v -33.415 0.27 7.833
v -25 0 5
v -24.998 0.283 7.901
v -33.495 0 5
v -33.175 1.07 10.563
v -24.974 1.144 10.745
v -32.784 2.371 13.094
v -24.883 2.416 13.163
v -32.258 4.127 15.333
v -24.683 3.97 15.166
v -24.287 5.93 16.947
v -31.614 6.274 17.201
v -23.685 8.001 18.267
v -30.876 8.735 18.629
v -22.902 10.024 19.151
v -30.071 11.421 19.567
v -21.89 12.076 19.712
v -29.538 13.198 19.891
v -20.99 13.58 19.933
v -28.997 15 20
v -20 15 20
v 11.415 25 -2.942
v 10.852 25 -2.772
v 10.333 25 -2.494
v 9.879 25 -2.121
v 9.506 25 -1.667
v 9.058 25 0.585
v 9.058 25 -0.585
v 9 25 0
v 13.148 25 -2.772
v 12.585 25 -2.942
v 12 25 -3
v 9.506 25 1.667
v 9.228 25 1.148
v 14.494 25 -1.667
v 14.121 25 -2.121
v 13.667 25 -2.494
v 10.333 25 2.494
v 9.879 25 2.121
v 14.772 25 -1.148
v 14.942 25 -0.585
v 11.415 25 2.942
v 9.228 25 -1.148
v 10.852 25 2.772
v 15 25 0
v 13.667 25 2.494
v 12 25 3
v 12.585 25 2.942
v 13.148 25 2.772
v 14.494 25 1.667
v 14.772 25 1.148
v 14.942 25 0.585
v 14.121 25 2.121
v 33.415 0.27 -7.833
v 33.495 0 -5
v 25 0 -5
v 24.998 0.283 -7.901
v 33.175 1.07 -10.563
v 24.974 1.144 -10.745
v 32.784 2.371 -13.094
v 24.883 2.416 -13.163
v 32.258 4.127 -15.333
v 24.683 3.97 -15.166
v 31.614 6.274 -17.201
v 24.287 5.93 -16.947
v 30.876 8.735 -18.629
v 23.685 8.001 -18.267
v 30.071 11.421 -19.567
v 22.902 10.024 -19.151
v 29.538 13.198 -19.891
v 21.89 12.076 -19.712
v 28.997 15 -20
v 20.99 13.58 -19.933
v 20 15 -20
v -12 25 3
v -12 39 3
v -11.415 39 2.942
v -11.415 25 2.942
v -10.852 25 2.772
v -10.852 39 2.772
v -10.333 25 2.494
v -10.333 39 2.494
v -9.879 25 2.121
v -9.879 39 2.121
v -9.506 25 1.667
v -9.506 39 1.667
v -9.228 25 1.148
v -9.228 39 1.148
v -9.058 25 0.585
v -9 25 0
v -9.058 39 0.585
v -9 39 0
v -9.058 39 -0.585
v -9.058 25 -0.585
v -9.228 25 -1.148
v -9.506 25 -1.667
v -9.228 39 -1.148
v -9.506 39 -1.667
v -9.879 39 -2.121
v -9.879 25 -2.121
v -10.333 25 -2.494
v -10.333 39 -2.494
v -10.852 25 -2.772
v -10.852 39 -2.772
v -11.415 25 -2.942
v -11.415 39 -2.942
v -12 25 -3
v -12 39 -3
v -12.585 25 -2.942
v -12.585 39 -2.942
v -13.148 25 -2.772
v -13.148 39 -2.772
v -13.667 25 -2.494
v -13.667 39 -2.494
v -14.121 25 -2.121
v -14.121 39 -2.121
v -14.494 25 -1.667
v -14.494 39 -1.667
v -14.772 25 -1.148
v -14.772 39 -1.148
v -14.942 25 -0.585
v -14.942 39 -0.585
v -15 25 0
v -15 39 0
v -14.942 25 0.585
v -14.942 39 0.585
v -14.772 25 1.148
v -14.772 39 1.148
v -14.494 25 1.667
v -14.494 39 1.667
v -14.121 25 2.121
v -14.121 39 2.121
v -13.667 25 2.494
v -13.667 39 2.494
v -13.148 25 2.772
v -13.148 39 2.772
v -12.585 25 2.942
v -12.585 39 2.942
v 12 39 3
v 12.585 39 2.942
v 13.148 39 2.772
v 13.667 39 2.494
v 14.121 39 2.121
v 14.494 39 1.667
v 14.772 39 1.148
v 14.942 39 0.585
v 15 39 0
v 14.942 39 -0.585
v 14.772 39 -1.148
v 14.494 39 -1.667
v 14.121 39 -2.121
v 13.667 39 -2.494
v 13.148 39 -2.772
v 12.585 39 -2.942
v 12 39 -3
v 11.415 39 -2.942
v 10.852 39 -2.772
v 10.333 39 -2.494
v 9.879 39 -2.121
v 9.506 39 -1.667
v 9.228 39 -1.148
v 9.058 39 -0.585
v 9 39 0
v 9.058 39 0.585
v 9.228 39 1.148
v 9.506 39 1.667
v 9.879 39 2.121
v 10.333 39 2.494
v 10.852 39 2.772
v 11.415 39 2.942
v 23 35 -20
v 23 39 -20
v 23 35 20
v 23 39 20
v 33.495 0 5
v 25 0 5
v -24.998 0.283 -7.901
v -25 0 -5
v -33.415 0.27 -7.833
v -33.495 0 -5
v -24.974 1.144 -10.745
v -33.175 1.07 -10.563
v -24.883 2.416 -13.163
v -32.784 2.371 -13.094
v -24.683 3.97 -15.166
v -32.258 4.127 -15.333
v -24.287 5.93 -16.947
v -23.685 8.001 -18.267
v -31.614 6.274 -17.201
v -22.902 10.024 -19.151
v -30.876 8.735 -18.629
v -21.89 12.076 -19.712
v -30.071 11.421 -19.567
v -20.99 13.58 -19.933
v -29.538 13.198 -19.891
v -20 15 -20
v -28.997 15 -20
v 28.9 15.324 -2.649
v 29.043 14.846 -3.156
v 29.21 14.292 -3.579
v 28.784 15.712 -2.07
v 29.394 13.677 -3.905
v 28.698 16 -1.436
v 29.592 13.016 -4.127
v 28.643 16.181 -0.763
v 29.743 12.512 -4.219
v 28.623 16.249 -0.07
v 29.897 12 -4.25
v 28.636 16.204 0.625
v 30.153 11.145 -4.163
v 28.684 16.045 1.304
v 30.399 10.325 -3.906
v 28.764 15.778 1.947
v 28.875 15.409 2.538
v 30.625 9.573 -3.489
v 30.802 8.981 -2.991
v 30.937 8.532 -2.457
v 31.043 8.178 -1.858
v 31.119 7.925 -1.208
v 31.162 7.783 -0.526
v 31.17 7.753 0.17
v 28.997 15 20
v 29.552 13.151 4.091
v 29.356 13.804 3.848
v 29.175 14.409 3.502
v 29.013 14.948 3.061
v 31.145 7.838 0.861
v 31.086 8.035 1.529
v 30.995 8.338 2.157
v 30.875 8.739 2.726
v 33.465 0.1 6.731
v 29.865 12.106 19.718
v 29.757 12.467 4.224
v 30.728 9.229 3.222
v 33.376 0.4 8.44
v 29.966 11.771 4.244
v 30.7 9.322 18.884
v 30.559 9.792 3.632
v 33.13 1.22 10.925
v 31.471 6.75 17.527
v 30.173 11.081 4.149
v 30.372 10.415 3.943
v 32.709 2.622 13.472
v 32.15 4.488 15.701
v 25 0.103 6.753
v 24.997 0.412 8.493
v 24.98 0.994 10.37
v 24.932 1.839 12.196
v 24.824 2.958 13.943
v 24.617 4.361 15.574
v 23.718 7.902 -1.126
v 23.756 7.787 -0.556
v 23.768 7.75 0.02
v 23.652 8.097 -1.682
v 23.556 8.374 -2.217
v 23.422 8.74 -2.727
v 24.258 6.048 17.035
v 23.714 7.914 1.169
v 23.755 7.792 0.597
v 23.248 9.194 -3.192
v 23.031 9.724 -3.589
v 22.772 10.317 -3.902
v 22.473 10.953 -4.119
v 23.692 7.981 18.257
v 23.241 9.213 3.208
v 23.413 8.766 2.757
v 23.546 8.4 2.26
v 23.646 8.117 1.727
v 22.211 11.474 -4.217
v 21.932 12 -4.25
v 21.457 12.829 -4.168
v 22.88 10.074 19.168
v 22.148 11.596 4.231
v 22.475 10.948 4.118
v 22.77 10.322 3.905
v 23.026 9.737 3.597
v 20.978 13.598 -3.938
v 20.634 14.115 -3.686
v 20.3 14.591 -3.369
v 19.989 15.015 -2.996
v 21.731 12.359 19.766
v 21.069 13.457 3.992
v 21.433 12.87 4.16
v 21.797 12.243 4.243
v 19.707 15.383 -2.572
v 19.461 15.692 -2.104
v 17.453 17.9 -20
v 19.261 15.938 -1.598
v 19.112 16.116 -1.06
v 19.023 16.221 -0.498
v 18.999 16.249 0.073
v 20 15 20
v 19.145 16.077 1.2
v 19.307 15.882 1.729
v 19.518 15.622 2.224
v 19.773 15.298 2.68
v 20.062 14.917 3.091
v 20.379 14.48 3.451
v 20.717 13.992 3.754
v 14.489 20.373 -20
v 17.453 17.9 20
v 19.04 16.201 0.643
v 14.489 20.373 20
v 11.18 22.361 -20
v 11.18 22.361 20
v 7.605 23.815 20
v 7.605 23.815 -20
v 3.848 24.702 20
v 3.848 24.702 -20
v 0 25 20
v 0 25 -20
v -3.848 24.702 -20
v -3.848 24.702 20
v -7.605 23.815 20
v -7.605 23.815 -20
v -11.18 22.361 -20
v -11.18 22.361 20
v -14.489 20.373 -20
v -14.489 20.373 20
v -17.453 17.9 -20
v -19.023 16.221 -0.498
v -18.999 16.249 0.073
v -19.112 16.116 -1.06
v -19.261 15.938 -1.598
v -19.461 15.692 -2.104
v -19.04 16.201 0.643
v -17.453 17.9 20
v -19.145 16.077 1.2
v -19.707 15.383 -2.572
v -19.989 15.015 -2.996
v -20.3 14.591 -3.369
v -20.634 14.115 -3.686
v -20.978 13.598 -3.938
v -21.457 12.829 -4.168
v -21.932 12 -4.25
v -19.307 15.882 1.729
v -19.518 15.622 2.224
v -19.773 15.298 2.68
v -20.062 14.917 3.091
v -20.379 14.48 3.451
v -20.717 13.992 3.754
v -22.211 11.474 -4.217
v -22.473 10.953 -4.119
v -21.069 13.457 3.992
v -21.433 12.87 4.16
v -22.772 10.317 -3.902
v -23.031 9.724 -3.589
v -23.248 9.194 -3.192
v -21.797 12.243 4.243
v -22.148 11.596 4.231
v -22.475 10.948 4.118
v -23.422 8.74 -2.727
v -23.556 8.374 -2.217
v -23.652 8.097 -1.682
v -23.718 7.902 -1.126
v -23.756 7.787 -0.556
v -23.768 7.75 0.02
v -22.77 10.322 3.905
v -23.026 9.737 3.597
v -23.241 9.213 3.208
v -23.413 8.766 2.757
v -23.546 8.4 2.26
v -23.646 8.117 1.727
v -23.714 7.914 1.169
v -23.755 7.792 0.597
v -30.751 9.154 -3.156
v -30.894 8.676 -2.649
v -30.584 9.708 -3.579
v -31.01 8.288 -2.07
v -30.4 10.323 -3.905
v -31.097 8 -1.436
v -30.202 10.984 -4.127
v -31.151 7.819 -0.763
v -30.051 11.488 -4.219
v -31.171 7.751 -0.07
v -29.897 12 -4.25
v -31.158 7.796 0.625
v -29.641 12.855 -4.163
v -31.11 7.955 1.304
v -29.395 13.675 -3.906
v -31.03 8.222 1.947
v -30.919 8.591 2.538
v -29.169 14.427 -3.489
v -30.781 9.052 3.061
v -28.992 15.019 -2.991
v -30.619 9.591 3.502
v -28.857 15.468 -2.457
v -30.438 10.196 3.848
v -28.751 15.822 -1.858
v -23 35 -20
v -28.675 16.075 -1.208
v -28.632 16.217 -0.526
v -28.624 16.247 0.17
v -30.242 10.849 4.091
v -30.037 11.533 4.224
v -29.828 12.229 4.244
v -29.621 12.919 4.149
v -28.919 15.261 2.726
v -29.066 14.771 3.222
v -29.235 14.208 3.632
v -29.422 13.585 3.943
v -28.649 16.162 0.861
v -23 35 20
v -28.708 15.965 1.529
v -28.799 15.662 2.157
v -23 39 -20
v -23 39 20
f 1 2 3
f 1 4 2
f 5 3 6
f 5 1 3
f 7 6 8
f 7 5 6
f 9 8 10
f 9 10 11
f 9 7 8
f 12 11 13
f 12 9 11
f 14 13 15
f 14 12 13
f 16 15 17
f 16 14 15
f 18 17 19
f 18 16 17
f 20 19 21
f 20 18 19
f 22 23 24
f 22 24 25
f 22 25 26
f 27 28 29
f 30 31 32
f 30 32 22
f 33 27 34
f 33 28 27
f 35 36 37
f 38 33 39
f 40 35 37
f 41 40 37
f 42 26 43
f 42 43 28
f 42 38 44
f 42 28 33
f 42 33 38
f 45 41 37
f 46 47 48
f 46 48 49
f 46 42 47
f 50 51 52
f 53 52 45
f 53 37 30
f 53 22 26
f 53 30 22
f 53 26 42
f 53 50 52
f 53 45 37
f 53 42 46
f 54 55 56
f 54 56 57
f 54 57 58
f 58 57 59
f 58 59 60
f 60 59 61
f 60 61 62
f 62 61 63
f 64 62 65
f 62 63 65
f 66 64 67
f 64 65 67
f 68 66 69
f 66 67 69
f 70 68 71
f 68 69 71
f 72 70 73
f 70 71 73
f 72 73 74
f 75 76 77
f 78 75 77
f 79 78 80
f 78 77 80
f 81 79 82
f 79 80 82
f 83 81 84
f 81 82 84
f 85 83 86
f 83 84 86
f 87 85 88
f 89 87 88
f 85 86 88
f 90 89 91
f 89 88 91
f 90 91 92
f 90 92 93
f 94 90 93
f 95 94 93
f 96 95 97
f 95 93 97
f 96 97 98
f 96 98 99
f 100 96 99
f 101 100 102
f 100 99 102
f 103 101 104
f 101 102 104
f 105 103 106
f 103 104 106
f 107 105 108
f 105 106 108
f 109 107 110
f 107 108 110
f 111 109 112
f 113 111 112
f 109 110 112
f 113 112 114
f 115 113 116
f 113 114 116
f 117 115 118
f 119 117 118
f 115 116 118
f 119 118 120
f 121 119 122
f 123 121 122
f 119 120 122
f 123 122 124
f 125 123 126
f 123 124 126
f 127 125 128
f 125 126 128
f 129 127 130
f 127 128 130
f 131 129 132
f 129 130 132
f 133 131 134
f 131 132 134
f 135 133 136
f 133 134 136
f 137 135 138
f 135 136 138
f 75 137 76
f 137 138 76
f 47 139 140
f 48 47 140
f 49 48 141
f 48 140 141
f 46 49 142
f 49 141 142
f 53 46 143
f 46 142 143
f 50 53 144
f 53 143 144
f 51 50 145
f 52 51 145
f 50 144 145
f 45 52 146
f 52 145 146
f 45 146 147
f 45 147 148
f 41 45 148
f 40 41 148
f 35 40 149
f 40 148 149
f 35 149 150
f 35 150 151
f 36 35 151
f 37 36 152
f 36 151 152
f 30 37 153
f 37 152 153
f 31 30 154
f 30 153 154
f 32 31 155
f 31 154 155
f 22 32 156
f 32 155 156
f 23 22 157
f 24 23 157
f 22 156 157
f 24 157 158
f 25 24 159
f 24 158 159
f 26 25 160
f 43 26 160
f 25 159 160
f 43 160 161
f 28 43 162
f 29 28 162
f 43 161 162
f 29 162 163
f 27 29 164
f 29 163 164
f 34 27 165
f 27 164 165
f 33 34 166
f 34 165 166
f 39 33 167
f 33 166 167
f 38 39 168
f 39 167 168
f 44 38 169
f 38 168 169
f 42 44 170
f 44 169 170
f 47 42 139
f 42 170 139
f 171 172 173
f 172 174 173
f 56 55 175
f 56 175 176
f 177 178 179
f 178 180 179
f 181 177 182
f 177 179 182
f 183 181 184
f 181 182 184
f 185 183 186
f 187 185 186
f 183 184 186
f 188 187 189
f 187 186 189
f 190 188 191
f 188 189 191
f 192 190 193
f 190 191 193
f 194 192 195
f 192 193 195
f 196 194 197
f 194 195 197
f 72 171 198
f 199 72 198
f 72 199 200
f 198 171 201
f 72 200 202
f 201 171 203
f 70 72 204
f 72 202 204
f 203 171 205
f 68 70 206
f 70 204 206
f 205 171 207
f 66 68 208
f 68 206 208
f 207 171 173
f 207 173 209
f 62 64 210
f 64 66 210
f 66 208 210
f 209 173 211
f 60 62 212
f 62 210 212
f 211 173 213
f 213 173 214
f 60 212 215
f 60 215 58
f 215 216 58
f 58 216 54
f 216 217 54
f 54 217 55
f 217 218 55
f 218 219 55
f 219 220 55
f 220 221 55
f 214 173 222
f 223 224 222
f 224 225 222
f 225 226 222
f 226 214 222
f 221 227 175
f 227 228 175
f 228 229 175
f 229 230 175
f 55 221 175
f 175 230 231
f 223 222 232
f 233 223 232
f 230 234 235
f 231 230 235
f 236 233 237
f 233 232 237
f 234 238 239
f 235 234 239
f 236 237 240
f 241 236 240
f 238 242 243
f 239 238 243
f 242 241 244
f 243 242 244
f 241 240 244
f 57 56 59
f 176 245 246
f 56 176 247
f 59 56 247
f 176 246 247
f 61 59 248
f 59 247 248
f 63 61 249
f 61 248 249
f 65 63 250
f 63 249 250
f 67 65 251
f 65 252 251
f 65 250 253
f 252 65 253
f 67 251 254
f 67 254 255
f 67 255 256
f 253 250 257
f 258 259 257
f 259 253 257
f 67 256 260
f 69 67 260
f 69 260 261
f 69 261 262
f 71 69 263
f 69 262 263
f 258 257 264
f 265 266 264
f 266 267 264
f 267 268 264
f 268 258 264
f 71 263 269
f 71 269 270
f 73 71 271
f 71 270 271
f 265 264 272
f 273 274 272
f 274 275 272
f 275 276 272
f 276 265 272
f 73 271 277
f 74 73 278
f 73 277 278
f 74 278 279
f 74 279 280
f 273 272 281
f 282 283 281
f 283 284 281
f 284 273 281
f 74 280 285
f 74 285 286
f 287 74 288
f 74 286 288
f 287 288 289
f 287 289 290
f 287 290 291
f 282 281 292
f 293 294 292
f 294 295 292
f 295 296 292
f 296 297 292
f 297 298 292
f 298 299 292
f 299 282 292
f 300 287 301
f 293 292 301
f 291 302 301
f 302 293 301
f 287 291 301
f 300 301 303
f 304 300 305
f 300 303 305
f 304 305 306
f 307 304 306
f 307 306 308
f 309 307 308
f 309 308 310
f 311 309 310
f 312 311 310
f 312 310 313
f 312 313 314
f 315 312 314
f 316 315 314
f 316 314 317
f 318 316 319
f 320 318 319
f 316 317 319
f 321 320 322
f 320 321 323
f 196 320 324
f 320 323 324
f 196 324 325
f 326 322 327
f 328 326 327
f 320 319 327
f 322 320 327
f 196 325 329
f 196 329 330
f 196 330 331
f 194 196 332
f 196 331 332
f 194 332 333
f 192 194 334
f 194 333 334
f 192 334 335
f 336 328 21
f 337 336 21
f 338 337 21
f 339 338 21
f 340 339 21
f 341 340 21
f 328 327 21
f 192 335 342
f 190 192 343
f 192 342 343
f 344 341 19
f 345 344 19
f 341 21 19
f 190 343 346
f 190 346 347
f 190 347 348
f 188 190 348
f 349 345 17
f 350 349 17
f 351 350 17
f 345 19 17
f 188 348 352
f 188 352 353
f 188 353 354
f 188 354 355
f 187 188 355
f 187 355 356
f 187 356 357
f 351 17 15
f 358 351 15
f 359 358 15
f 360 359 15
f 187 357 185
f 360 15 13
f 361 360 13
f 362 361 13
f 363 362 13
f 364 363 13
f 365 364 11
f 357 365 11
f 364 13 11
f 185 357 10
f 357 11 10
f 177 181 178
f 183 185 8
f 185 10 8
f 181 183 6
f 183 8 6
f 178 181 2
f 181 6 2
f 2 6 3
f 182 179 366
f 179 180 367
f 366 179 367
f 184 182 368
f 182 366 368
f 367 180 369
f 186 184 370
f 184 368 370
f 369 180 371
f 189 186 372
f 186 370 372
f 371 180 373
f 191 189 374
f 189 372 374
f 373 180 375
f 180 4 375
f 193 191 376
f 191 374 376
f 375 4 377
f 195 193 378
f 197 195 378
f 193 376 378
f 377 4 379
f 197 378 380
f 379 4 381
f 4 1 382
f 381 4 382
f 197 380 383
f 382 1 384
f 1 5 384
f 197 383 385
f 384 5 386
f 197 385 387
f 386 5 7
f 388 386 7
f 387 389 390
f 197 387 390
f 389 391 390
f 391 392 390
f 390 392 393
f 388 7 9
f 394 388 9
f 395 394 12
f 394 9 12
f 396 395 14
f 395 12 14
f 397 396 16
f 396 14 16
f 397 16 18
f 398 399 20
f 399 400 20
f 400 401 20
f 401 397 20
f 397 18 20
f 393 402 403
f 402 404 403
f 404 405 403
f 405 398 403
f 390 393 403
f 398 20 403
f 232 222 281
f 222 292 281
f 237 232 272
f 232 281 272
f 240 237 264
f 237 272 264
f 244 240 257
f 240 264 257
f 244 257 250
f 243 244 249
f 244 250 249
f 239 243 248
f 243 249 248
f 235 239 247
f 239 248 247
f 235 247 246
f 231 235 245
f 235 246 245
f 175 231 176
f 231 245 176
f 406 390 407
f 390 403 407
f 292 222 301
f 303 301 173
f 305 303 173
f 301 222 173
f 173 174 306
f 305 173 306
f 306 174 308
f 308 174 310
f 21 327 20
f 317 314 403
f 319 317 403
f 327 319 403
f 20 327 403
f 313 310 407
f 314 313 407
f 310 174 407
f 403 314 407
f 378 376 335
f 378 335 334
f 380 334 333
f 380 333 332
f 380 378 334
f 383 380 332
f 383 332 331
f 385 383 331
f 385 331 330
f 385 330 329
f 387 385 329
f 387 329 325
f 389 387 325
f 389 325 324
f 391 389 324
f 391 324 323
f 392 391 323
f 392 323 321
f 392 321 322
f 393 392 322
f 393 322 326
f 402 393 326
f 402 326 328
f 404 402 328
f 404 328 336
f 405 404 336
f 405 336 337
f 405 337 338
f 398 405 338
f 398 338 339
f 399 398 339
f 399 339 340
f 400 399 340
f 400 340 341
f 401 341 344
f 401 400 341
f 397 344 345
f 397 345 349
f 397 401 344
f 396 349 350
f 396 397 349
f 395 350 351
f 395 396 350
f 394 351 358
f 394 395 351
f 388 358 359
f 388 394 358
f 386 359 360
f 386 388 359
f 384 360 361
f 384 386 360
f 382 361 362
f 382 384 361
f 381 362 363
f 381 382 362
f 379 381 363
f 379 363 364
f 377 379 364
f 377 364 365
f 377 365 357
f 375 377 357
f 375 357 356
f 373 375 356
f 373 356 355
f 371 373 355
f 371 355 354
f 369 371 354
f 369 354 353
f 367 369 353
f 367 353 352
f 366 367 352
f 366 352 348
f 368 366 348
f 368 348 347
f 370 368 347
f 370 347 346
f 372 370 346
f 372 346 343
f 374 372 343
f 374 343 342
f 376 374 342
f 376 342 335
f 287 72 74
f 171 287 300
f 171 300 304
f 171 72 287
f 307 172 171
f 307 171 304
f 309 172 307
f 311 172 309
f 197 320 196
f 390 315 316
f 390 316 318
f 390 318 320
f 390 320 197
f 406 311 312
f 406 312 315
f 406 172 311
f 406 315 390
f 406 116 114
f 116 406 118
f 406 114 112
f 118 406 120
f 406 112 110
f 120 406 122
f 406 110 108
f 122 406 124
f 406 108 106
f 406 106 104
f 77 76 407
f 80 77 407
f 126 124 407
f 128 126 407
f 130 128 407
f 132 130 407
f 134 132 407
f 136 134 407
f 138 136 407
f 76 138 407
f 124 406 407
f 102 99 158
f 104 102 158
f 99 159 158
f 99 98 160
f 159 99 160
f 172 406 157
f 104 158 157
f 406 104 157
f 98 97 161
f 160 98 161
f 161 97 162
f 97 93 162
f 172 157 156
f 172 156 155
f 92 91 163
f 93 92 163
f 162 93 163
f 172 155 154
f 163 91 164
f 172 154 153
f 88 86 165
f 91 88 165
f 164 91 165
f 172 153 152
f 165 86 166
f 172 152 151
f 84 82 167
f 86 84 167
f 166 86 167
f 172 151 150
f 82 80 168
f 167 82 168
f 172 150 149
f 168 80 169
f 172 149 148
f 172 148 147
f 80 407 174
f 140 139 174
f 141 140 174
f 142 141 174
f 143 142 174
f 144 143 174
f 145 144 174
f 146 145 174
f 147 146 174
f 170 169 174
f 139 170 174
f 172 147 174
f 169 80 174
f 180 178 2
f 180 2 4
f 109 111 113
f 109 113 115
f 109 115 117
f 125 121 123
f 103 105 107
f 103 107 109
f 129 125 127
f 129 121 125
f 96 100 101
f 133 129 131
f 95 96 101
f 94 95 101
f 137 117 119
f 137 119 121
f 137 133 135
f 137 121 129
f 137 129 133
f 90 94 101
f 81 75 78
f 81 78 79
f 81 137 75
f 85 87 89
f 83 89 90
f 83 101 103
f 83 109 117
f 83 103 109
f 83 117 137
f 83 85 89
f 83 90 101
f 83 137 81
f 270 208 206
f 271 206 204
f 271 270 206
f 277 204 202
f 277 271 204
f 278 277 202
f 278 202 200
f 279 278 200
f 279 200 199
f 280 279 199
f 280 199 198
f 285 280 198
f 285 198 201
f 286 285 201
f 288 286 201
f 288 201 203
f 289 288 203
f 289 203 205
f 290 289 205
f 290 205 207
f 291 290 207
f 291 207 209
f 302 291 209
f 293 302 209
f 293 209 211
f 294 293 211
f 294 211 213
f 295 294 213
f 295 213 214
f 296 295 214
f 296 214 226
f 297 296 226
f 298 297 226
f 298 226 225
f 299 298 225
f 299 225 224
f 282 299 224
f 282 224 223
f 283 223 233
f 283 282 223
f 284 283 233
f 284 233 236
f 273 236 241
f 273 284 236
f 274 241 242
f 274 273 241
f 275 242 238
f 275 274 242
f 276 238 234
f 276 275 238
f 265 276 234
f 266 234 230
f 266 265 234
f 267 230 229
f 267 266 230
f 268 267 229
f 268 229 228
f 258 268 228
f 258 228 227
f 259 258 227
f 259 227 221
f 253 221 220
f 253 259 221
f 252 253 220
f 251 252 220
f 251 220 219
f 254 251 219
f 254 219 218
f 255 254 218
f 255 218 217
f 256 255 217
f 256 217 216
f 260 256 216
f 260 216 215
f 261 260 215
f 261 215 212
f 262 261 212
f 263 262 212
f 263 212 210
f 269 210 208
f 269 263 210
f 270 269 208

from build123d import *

# Parameters (mm, degrees)
BOSS_EXTRUDE1_DEPTH     = 20
FILLET1_R               = 15
CUT_EXTRUDE1_DEPTH      = 56.162909807
CUT_EXTRUDE1_DEPTH_BACK = 56.162909807
SKETCH3_R               = 4.25
SKETCH4_R               = 3
CUT_EXTRUDE2_DEPTH      = 14


with BuildPart() as part:
    # Sketch1 → Boss-Extrude1 (new, symmetric)
    with BuildSketch(Plane.XY):
        with BuildLine():
            Line((-25, 0), (-33.49547145, 0))
            Line((-33.49547145, 0), (-23, 35))
            Line((-23, 35), (-23, 39))
            Line((-23, 39), (23, 39))
            Line((23, 39), (23, 35))
            Line((23, 35), (33.49547145, 0))
            Line((33.49547145, 0), (25, 0))
            ThreePointArc((25, 0), (0, 25), (-25, 0))
        make_face()
    extrude(amount=BOSS_EXTRUDE1_DEPTH, both=True)

    # Fillet1
    fillet1_edges = [part.edges().sort_by_distance(p)[0] for p in [
        (-29.247735725, 0, 20),
        (29.247735725, 0, 20),
        (29.247735725, 0, -20),
        (-29.247735725, 0, -20),
    ]]
    fillet(fillet1_edges, radius=FILLET1_R)

    # Sketch3 → Cut-Extrude1 (cut, two sides: drawn at the far end of the back side and taken through both)
    with BuildSketch(Plane(origin=(0, 0, 0), x_dir=(0, 0, -1), z_dir=(1, 0, 0)).offset(-CUT_EXTRUDE1_DEPTH_BACK)):
        with Locations((0, 12)):
            Circle(SKETCH3_R)
    extrude(amount=CUT_EXTRUDE1_DEPTH + CUT_EXTRUDE1_DEPTH_BACK, mode=Mode.SUBTRACT)

    # Sketch4 → Cut-Extrude2 (cut)
    with BuildSketch(Plane(origin=(0, 39, 0), x_dir=(1, 0, 0), z_dir=(0, 1, 0))):
        with Locations(Location((-12, 0, 0), (0, 0, 270))):
            Circle(SKETCH4_R)
        with Locations(Location((12, 0, 0), (0, 0, 270))):
            Circle(SKETCH4_R)
    extrude(amount=-CUT_EXTRUDE2_DEPTH, mode=Mode.SUBTRACT)


solid = part.part
